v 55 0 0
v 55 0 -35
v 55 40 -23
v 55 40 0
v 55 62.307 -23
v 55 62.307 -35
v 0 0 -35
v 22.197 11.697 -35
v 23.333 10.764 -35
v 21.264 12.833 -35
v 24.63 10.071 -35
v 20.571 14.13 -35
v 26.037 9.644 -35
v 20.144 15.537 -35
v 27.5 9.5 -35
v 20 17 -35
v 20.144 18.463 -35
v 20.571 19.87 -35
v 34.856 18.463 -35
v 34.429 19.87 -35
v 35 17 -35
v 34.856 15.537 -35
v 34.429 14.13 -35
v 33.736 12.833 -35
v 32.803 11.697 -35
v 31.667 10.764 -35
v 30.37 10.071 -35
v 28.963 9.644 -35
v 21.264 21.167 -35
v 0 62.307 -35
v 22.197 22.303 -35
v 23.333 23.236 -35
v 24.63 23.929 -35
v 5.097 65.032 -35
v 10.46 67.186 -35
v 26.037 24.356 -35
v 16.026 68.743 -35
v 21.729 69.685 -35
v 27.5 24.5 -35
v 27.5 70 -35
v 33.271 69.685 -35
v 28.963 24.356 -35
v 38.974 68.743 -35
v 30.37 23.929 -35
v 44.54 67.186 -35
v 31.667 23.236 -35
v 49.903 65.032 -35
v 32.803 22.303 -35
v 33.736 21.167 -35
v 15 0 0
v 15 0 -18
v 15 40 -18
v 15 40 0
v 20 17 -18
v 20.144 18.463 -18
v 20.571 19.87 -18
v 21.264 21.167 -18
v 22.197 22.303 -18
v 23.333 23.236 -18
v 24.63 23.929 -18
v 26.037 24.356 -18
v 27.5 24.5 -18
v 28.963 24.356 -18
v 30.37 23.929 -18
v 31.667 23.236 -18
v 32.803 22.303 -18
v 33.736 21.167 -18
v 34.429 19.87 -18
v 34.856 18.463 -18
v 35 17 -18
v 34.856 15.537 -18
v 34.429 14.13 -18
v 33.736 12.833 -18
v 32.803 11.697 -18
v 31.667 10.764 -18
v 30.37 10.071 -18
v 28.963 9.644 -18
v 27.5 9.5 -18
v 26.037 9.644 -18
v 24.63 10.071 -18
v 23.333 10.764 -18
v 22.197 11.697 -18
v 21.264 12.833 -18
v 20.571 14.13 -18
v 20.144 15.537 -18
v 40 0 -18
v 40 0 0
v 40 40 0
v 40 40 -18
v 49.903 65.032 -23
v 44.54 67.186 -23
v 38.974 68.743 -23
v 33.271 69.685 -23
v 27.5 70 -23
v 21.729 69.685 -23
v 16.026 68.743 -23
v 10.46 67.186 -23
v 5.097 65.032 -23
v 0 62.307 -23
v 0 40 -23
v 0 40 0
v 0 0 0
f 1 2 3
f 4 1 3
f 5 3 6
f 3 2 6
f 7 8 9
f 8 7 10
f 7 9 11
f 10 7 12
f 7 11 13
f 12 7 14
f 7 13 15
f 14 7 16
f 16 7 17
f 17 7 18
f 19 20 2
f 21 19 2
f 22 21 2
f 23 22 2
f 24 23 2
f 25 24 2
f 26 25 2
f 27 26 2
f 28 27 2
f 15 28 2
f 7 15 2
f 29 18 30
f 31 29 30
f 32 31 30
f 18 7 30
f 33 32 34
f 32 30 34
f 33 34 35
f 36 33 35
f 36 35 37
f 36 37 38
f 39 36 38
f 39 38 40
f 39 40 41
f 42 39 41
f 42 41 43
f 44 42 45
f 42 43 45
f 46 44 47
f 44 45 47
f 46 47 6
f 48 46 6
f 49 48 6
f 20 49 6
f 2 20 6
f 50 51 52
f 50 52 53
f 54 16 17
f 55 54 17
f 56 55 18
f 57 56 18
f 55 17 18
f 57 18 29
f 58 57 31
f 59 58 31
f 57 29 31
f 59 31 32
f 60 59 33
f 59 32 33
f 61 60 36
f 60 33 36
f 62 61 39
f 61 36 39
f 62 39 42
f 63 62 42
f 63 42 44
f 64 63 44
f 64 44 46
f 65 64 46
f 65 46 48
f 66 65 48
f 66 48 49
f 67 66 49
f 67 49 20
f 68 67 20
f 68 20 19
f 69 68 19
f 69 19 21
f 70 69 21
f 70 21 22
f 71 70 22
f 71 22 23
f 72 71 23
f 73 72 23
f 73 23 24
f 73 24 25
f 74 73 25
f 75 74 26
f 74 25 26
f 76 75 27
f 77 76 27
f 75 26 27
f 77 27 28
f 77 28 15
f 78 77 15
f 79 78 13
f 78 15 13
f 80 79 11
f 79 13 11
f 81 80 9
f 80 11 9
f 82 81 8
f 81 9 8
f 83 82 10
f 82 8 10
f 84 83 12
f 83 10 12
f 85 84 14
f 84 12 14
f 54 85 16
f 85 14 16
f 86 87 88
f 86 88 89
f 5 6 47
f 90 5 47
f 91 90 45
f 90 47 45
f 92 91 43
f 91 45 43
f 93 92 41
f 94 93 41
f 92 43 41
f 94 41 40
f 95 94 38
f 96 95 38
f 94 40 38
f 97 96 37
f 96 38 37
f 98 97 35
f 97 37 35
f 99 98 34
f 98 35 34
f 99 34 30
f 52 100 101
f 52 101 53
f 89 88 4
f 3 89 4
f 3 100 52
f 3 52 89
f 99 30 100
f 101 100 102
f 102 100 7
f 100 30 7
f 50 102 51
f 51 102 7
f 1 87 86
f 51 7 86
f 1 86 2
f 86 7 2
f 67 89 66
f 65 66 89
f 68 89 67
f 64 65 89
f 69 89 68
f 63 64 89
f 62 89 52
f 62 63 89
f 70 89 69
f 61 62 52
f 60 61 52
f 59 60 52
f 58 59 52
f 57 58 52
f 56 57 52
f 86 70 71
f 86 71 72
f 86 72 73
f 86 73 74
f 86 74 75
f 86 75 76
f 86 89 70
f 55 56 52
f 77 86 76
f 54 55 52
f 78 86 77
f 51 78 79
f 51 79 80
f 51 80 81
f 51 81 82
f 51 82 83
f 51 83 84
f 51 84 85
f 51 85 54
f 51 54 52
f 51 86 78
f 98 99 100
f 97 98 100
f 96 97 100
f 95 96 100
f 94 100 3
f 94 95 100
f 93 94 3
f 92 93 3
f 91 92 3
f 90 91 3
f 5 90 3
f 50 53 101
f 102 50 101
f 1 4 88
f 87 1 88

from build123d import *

# Parameters (mm, degrees)
BOSS_EXTRU_2_DEPTH      = 40
ESQUISSE2_W             = 55
ESQUISSE2_H             = 12
BOSS_EXTRU_3_DEPTH      = 40
BOSS_EXTRU_4_DEPTH      = 12
ESQUISSE4_R             = 7.5
ENL_V_MAT_EXTRU_1_DEPTH = 96.655632349


with BuildPart() as part:
    # Esquisse1 → Boss.-Extru.2 (new body)
    with BuildSketch(Plane(origin=(0, 0, 0), x_dir=(1, 0, 0), z_dir=(0, 1, 0))):
        Polygon((0, 0), (0, 23), (55, 23), (55, 0), (40, 0), (40, 18), (15, 18), (15, 0), align=None)
    extrude(amount=BOSS_EXTRU_2_DEPTH)

    # Esquisse2 → Boss.-Extru.3 (add)
    with BuildSketch(Plane(origin=(0, 0, 0), x_dir=(1, 0, 0), z_dir=(0, 1, 0))):
        with Locations((27.5, 29)):
            Rectangle(ESQUISSE2_W, ESQUISSE2_H)
    extrude(amount=BOSS_EXTRU_3_DEPTH)

    # Esquisse3 → Boss.-Extru.4 (add)
    with BuildSketch(Plane(origin=(0, 0, -35), x_dir=(-1, 0, 0), z_dir=(0, 0, -1))):
        with BuildLine():
            Line((-55, 40), (-55, 62.307284183))
            ThreePointArc((-55, 62.307284183), (-27.5, 70), (0, 62.307284183))
            Line((0, 62.307284183), (0, 40))
            Line((0, 40), (-55, 40))
        make_face()
    extrude(amount=-BOSS_EXTRU_4_DEPTH)

    # Esquisse4 → Enlèv. mat.-Extru.1 (cut, through all)
    with BuildSketch(Plane(origin=(0, 0, -35), x_dir=(-1, 0, 0), z_dir=(0, 0, -1))):
        with Locations((-27.5, 17)):
            Circle(ESQUISSE4_R)
    extrude(amount=-ENL_V_MAT_EXTRU_1_DEPTH, mode=Mode.SUBTRACT)


solid = part.part
